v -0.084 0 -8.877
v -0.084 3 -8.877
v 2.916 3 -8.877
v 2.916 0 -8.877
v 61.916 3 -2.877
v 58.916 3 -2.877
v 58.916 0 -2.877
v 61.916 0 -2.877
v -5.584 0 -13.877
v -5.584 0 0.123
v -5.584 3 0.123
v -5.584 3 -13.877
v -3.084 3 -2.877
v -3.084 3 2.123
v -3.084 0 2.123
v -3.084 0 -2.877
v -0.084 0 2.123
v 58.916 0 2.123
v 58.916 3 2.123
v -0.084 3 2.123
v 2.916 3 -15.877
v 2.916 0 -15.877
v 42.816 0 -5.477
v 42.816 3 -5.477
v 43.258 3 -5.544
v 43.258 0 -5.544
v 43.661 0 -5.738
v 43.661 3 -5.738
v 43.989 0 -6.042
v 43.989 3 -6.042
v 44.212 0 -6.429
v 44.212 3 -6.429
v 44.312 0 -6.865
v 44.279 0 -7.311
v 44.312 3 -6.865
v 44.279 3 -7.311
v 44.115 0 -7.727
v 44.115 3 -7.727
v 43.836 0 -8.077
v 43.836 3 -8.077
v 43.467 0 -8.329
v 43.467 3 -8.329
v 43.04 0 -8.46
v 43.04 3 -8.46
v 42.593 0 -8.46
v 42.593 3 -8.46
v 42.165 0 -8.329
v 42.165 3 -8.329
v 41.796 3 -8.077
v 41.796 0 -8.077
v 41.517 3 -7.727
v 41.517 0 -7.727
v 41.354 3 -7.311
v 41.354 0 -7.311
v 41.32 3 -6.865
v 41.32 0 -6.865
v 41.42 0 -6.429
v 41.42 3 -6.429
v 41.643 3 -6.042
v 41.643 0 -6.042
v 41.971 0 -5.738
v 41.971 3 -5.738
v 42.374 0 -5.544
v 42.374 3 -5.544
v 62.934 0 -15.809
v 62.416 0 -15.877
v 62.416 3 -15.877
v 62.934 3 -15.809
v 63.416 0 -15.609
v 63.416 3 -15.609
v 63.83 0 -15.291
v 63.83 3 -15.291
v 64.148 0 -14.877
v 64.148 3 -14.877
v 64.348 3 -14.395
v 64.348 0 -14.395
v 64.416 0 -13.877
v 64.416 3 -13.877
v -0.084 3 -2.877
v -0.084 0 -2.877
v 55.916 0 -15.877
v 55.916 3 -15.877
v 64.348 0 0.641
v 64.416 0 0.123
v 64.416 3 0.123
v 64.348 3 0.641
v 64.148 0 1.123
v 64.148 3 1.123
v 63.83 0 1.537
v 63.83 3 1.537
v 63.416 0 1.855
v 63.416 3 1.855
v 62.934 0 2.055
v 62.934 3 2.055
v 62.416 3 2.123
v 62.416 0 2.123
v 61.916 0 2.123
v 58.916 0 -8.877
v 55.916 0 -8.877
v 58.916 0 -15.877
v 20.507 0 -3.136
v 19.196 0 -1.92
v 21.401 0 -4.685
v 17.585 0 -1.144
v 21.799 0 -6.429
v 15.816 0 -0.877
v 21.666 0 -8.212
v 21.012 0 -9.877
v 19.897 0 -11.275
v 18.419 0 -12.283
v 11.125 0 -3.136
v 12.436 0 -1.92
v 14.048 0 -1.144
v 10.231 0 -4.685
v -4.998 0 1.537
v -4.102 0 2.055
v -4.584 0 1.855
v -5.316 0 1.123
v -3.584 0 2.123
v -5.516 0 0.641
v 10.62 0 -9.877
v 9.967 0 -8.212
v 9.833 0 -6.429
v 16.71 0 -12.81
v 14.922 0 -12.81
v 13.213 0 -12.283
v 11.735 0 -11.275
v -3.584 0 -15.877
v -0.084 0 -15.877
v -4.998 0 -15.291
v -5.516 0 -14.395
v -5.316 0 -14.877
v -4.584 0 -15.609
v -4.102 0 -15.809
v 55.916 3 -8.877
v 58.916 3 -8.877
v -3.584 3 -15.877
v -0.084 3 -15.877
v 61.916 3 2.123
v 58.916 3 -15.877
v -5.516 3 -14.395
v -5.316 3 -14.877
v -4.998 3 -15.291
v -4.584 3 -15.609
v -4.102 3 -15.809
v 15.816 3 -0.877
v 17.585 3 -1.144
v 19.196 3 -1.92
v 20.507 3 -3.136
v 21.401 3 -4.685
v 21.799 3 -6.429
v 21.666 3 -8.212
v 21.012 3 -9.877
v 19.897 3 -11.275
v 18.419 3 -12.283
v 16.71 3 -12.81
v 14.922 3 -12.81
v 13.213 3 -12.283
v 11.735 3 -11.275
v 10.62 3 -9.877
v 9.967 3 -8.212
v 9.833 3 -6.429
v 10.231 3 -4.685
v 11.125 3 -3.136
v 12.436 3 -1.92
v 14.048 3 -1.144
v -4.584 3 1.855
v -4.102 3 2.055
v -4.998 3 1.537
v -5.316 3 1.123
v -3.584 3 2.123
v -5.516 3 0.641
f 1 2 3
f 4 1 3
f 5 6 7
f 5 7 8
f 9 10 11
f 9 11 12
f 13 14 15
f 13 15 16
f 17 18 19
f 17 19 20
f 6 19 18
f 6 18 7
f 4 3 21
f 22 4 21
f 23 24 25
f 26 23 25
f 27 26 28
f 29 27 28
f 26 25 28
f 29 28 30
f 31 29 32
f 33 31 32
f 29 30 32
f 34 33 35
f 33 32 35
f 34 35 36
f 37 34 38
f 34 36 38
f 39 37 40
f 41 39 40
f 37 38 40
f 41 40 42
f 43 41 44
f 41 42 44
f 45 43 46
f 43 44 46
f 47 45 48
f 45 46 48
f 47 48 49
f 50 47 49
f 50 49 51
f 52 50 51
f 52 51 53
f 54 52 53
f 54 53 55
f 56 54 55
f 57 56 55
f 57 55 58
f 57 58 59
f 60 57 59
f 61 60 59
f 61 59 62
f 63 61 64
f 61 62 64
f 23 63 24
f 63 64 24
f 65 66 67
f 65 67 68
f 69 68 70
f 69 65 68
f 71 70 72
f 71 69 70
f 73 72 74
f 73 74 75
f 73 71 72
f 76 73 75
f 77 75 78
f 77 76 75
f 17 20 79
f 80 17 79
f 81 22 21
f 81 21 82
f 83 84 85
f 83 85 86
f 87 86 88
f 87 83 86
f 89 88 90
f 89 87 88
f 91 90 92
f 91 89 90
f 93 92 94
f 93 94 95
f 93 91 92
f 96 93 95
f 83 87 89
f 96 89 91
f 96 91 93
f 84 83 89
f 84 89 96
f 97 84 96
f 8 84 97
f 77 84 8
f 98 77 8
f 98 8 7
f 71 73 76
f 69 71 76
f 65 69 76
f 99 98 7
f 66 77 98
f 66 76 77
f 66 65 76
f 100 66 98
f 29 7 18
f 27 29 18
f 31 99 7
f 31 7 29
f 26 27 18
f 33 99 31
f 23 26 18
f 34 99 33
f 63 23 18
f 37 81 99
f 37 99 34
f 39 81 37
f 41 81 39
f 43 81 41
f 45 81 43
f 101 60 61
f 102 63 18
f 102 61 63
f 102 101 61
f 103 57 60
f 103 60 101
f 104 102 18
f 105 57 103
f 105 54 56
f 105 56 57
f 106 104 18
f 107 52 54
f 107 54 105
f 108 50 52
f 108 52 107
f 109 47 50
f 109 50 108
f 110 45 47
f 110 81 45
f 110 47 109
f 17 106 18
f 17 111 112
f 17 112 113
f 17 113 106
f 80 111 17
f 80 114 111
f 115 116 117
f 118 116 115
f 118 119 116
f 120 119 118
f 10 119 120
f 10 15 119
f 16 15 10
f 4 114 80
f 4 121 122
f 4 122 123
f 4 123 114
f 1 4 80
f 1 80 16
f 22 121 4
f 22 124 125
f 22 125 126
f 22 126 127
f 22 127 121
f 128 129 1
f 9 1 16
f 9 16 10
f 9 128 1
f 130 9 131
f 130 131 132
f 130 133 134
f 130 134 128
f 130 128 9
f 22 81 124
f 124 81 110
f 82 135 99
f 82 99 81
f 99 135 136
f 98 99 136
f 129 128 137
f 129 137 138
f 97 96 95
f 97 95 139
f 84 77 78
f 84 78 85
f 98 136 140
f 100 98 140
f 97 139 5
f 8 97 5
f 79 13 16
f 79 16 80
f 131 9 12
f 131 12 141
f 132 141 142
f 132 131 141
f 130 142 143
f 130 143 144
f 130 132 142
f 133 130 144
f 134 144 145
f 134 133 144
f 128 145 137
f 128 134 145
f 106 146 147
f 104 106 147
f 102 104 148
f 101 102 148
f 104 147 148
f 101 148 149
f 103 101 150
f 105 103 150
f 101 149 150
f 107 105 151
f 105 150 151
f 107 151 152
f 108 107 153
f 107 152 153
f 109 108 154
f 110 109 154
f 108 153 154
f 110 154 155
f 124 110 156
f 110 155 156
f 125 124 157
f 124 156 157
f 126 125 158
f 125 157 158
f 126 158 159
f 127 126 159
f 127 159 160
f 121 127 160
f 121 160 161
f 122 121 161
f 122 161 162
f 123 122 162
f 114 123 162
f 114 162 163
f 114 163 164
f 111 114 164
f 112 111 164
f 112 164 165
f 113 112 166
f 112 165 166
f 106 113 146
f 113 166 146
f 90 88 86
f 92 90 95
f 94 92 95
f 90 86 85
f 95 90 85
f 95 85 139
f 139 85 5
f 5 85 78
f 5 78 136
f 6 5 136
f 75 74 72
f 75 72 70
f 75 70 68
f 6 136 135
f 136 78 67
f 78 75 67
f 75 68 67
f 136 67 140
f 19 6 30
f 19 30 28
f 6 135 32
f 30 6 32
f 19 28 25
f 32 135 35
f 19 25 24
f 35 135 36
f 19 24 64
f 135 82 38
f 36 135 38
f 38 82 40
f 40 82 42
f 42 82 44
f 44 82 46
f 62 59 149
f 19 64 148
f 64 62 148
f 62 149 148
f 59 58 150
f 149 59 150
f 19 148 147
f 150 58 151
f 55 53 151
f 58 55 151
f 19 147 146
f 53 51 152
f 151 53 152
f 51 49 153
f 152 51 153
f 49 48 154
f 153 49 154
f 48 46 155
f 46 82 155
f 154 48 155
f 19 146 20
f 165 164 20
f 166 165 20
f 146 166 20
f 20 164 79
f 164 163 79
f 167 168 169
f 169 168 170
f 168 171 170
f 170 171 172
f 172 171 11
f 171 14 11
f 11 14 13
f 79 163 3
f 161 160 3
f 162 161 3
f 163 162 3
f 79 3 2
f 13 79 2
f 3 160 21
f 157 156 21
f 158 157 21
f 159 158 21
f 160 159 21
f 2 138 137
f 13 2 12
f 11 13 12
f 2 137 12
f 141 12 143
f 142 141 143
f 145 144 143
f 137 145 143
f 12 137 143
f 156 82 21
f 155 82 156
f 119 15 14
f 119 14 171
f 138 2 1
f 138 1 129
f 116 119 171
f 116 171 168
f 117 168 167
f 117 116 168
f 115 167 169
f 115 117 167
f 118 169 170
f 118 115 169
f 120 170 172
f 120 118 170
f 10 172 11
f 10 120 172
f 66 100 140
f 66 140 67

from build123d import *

# Parameters (mm, degrees)
BOSS_EXTRUDE1_DEPTH = 3
SKETCH6_W           = 3
SKETCH6_H           = 7
CUT_EXTRUDE3_DEPTH  = 3
SKETCH7_R           = 1.5
CUT_EXTRUDE4_DEPTH  = 3
SKETCH8_W           = 3
SKETCH8_H           = 5
CUT_EXTRUDE5_DEPTH  = 3
SKETCH9_R           = 6
CUT_EXTRUDE6_DEPTH  = 3


with BuildPart() as part:
    # Sketch2 → Boss-Extrude1 (new body)
    with BuildSketch(Plane(origin=(0, 0, 0), x_dir=(1, 0, 0), z_dir=(0, 1, 0))):
        with BuildLine():
            Line((-3.583885407, 15.877073113), (62.416114593, 15.877073113))
            ThreePointArc((62.416114593, 15.877073113), (63.830328155, 15.291286675), (64.416114593, 13.877073113))
            Line((64.416114593, 13.877073113), (64.416114593, -0.122926887))
            ThreePointArc((64.416114593, -0.122926887), (63.830328155, -1.53714045), (62.416114593, -2.122926887))
            Line((62.416114593, -2.122926887), (-3.583885407, -2.122926887))
            ThreePointArc((-3.583885407, -2.122926887), (-4.99809897, -1.53714045), (-5.583885407, -0.122926887))
            Line((-5.583885407, -0.122926887), (-5.583885407, 13.877073113))
            ThreePointArc((-5.583885407, 13.877073113), (-4.99809897, 15.291286675), (-3.583885407, 15.877073113))
        make_face()
    extrude(amount=BOSS_EXTRUDE1_DEPTH)

    # Sketch6 → Cut-Extrude3 (cut)
    with BuildSketch(Plane(origin=(0, 3, 0), x_dir=(1, 0, 0), z_dir=(0, 1, 0))):
        with Locations((1.416114593, 12.377073113)):
            Rectangle(SKETCH6_W, SKETCH6_H)
        with Locations((57.416114593, 12.377073113)):
            Rectangle(SKETCH6_W, SKETCH6_H)
    extrude(amount=-CUT_EXTRUDE3_DEPTH, mode=Mode.SUBTRACT)

    # Sketch7 → Cut-Extrude4 (cut)
    with BuildSketch(Plane(origin=(0, 3, 0), x_dir=(1, 0, 0), z_dir=(0, 1, 0))):
        with Locations(Location((42.816114593, 6.977073113, 0), (0, 0, 270))):
            Circle(SKETCH7_R)
    extrude(amount=-CUT_EXTRUDE4_DEPTH, mode=Mode.SUBTRACT)

    # Sketch8 → Cut-Extrude5 (cut)
    with BuildSketch(Plane(origin=(0, 3, 0), x_dir=(1, 0, 0), z_dir=(0, 1, 0))):
        with Locations((60.416114593, 0.377073113)):
            Rectangle(SKETCH8_W, SKETCH8_H)
        with Locations((-1.583885407, 0.377073113)):
            Rectangle(SKETCH8_W, SKETCH8_H)
    extrude(amount=-CUT_EXTRUDE5_DEPTH, mode=Mode.SUBTRACT)

    # Sketch9 → Cut-Extrude6 (cut)
    with BuildSketch(Plane(origin=(0, 3, 0), x_dir=(1, 0, 0), z_dir=(0, 1, 0))):
        with Locations(Location((15.816114593, 6.877073113, 0), (0, 0, 270))):
            Circle(SKETCH9_R)
    extrude(amount=-CUT_EXTRUDE6_DEPTH, mode=Mode.SUBTRACT)


solid = part.part
